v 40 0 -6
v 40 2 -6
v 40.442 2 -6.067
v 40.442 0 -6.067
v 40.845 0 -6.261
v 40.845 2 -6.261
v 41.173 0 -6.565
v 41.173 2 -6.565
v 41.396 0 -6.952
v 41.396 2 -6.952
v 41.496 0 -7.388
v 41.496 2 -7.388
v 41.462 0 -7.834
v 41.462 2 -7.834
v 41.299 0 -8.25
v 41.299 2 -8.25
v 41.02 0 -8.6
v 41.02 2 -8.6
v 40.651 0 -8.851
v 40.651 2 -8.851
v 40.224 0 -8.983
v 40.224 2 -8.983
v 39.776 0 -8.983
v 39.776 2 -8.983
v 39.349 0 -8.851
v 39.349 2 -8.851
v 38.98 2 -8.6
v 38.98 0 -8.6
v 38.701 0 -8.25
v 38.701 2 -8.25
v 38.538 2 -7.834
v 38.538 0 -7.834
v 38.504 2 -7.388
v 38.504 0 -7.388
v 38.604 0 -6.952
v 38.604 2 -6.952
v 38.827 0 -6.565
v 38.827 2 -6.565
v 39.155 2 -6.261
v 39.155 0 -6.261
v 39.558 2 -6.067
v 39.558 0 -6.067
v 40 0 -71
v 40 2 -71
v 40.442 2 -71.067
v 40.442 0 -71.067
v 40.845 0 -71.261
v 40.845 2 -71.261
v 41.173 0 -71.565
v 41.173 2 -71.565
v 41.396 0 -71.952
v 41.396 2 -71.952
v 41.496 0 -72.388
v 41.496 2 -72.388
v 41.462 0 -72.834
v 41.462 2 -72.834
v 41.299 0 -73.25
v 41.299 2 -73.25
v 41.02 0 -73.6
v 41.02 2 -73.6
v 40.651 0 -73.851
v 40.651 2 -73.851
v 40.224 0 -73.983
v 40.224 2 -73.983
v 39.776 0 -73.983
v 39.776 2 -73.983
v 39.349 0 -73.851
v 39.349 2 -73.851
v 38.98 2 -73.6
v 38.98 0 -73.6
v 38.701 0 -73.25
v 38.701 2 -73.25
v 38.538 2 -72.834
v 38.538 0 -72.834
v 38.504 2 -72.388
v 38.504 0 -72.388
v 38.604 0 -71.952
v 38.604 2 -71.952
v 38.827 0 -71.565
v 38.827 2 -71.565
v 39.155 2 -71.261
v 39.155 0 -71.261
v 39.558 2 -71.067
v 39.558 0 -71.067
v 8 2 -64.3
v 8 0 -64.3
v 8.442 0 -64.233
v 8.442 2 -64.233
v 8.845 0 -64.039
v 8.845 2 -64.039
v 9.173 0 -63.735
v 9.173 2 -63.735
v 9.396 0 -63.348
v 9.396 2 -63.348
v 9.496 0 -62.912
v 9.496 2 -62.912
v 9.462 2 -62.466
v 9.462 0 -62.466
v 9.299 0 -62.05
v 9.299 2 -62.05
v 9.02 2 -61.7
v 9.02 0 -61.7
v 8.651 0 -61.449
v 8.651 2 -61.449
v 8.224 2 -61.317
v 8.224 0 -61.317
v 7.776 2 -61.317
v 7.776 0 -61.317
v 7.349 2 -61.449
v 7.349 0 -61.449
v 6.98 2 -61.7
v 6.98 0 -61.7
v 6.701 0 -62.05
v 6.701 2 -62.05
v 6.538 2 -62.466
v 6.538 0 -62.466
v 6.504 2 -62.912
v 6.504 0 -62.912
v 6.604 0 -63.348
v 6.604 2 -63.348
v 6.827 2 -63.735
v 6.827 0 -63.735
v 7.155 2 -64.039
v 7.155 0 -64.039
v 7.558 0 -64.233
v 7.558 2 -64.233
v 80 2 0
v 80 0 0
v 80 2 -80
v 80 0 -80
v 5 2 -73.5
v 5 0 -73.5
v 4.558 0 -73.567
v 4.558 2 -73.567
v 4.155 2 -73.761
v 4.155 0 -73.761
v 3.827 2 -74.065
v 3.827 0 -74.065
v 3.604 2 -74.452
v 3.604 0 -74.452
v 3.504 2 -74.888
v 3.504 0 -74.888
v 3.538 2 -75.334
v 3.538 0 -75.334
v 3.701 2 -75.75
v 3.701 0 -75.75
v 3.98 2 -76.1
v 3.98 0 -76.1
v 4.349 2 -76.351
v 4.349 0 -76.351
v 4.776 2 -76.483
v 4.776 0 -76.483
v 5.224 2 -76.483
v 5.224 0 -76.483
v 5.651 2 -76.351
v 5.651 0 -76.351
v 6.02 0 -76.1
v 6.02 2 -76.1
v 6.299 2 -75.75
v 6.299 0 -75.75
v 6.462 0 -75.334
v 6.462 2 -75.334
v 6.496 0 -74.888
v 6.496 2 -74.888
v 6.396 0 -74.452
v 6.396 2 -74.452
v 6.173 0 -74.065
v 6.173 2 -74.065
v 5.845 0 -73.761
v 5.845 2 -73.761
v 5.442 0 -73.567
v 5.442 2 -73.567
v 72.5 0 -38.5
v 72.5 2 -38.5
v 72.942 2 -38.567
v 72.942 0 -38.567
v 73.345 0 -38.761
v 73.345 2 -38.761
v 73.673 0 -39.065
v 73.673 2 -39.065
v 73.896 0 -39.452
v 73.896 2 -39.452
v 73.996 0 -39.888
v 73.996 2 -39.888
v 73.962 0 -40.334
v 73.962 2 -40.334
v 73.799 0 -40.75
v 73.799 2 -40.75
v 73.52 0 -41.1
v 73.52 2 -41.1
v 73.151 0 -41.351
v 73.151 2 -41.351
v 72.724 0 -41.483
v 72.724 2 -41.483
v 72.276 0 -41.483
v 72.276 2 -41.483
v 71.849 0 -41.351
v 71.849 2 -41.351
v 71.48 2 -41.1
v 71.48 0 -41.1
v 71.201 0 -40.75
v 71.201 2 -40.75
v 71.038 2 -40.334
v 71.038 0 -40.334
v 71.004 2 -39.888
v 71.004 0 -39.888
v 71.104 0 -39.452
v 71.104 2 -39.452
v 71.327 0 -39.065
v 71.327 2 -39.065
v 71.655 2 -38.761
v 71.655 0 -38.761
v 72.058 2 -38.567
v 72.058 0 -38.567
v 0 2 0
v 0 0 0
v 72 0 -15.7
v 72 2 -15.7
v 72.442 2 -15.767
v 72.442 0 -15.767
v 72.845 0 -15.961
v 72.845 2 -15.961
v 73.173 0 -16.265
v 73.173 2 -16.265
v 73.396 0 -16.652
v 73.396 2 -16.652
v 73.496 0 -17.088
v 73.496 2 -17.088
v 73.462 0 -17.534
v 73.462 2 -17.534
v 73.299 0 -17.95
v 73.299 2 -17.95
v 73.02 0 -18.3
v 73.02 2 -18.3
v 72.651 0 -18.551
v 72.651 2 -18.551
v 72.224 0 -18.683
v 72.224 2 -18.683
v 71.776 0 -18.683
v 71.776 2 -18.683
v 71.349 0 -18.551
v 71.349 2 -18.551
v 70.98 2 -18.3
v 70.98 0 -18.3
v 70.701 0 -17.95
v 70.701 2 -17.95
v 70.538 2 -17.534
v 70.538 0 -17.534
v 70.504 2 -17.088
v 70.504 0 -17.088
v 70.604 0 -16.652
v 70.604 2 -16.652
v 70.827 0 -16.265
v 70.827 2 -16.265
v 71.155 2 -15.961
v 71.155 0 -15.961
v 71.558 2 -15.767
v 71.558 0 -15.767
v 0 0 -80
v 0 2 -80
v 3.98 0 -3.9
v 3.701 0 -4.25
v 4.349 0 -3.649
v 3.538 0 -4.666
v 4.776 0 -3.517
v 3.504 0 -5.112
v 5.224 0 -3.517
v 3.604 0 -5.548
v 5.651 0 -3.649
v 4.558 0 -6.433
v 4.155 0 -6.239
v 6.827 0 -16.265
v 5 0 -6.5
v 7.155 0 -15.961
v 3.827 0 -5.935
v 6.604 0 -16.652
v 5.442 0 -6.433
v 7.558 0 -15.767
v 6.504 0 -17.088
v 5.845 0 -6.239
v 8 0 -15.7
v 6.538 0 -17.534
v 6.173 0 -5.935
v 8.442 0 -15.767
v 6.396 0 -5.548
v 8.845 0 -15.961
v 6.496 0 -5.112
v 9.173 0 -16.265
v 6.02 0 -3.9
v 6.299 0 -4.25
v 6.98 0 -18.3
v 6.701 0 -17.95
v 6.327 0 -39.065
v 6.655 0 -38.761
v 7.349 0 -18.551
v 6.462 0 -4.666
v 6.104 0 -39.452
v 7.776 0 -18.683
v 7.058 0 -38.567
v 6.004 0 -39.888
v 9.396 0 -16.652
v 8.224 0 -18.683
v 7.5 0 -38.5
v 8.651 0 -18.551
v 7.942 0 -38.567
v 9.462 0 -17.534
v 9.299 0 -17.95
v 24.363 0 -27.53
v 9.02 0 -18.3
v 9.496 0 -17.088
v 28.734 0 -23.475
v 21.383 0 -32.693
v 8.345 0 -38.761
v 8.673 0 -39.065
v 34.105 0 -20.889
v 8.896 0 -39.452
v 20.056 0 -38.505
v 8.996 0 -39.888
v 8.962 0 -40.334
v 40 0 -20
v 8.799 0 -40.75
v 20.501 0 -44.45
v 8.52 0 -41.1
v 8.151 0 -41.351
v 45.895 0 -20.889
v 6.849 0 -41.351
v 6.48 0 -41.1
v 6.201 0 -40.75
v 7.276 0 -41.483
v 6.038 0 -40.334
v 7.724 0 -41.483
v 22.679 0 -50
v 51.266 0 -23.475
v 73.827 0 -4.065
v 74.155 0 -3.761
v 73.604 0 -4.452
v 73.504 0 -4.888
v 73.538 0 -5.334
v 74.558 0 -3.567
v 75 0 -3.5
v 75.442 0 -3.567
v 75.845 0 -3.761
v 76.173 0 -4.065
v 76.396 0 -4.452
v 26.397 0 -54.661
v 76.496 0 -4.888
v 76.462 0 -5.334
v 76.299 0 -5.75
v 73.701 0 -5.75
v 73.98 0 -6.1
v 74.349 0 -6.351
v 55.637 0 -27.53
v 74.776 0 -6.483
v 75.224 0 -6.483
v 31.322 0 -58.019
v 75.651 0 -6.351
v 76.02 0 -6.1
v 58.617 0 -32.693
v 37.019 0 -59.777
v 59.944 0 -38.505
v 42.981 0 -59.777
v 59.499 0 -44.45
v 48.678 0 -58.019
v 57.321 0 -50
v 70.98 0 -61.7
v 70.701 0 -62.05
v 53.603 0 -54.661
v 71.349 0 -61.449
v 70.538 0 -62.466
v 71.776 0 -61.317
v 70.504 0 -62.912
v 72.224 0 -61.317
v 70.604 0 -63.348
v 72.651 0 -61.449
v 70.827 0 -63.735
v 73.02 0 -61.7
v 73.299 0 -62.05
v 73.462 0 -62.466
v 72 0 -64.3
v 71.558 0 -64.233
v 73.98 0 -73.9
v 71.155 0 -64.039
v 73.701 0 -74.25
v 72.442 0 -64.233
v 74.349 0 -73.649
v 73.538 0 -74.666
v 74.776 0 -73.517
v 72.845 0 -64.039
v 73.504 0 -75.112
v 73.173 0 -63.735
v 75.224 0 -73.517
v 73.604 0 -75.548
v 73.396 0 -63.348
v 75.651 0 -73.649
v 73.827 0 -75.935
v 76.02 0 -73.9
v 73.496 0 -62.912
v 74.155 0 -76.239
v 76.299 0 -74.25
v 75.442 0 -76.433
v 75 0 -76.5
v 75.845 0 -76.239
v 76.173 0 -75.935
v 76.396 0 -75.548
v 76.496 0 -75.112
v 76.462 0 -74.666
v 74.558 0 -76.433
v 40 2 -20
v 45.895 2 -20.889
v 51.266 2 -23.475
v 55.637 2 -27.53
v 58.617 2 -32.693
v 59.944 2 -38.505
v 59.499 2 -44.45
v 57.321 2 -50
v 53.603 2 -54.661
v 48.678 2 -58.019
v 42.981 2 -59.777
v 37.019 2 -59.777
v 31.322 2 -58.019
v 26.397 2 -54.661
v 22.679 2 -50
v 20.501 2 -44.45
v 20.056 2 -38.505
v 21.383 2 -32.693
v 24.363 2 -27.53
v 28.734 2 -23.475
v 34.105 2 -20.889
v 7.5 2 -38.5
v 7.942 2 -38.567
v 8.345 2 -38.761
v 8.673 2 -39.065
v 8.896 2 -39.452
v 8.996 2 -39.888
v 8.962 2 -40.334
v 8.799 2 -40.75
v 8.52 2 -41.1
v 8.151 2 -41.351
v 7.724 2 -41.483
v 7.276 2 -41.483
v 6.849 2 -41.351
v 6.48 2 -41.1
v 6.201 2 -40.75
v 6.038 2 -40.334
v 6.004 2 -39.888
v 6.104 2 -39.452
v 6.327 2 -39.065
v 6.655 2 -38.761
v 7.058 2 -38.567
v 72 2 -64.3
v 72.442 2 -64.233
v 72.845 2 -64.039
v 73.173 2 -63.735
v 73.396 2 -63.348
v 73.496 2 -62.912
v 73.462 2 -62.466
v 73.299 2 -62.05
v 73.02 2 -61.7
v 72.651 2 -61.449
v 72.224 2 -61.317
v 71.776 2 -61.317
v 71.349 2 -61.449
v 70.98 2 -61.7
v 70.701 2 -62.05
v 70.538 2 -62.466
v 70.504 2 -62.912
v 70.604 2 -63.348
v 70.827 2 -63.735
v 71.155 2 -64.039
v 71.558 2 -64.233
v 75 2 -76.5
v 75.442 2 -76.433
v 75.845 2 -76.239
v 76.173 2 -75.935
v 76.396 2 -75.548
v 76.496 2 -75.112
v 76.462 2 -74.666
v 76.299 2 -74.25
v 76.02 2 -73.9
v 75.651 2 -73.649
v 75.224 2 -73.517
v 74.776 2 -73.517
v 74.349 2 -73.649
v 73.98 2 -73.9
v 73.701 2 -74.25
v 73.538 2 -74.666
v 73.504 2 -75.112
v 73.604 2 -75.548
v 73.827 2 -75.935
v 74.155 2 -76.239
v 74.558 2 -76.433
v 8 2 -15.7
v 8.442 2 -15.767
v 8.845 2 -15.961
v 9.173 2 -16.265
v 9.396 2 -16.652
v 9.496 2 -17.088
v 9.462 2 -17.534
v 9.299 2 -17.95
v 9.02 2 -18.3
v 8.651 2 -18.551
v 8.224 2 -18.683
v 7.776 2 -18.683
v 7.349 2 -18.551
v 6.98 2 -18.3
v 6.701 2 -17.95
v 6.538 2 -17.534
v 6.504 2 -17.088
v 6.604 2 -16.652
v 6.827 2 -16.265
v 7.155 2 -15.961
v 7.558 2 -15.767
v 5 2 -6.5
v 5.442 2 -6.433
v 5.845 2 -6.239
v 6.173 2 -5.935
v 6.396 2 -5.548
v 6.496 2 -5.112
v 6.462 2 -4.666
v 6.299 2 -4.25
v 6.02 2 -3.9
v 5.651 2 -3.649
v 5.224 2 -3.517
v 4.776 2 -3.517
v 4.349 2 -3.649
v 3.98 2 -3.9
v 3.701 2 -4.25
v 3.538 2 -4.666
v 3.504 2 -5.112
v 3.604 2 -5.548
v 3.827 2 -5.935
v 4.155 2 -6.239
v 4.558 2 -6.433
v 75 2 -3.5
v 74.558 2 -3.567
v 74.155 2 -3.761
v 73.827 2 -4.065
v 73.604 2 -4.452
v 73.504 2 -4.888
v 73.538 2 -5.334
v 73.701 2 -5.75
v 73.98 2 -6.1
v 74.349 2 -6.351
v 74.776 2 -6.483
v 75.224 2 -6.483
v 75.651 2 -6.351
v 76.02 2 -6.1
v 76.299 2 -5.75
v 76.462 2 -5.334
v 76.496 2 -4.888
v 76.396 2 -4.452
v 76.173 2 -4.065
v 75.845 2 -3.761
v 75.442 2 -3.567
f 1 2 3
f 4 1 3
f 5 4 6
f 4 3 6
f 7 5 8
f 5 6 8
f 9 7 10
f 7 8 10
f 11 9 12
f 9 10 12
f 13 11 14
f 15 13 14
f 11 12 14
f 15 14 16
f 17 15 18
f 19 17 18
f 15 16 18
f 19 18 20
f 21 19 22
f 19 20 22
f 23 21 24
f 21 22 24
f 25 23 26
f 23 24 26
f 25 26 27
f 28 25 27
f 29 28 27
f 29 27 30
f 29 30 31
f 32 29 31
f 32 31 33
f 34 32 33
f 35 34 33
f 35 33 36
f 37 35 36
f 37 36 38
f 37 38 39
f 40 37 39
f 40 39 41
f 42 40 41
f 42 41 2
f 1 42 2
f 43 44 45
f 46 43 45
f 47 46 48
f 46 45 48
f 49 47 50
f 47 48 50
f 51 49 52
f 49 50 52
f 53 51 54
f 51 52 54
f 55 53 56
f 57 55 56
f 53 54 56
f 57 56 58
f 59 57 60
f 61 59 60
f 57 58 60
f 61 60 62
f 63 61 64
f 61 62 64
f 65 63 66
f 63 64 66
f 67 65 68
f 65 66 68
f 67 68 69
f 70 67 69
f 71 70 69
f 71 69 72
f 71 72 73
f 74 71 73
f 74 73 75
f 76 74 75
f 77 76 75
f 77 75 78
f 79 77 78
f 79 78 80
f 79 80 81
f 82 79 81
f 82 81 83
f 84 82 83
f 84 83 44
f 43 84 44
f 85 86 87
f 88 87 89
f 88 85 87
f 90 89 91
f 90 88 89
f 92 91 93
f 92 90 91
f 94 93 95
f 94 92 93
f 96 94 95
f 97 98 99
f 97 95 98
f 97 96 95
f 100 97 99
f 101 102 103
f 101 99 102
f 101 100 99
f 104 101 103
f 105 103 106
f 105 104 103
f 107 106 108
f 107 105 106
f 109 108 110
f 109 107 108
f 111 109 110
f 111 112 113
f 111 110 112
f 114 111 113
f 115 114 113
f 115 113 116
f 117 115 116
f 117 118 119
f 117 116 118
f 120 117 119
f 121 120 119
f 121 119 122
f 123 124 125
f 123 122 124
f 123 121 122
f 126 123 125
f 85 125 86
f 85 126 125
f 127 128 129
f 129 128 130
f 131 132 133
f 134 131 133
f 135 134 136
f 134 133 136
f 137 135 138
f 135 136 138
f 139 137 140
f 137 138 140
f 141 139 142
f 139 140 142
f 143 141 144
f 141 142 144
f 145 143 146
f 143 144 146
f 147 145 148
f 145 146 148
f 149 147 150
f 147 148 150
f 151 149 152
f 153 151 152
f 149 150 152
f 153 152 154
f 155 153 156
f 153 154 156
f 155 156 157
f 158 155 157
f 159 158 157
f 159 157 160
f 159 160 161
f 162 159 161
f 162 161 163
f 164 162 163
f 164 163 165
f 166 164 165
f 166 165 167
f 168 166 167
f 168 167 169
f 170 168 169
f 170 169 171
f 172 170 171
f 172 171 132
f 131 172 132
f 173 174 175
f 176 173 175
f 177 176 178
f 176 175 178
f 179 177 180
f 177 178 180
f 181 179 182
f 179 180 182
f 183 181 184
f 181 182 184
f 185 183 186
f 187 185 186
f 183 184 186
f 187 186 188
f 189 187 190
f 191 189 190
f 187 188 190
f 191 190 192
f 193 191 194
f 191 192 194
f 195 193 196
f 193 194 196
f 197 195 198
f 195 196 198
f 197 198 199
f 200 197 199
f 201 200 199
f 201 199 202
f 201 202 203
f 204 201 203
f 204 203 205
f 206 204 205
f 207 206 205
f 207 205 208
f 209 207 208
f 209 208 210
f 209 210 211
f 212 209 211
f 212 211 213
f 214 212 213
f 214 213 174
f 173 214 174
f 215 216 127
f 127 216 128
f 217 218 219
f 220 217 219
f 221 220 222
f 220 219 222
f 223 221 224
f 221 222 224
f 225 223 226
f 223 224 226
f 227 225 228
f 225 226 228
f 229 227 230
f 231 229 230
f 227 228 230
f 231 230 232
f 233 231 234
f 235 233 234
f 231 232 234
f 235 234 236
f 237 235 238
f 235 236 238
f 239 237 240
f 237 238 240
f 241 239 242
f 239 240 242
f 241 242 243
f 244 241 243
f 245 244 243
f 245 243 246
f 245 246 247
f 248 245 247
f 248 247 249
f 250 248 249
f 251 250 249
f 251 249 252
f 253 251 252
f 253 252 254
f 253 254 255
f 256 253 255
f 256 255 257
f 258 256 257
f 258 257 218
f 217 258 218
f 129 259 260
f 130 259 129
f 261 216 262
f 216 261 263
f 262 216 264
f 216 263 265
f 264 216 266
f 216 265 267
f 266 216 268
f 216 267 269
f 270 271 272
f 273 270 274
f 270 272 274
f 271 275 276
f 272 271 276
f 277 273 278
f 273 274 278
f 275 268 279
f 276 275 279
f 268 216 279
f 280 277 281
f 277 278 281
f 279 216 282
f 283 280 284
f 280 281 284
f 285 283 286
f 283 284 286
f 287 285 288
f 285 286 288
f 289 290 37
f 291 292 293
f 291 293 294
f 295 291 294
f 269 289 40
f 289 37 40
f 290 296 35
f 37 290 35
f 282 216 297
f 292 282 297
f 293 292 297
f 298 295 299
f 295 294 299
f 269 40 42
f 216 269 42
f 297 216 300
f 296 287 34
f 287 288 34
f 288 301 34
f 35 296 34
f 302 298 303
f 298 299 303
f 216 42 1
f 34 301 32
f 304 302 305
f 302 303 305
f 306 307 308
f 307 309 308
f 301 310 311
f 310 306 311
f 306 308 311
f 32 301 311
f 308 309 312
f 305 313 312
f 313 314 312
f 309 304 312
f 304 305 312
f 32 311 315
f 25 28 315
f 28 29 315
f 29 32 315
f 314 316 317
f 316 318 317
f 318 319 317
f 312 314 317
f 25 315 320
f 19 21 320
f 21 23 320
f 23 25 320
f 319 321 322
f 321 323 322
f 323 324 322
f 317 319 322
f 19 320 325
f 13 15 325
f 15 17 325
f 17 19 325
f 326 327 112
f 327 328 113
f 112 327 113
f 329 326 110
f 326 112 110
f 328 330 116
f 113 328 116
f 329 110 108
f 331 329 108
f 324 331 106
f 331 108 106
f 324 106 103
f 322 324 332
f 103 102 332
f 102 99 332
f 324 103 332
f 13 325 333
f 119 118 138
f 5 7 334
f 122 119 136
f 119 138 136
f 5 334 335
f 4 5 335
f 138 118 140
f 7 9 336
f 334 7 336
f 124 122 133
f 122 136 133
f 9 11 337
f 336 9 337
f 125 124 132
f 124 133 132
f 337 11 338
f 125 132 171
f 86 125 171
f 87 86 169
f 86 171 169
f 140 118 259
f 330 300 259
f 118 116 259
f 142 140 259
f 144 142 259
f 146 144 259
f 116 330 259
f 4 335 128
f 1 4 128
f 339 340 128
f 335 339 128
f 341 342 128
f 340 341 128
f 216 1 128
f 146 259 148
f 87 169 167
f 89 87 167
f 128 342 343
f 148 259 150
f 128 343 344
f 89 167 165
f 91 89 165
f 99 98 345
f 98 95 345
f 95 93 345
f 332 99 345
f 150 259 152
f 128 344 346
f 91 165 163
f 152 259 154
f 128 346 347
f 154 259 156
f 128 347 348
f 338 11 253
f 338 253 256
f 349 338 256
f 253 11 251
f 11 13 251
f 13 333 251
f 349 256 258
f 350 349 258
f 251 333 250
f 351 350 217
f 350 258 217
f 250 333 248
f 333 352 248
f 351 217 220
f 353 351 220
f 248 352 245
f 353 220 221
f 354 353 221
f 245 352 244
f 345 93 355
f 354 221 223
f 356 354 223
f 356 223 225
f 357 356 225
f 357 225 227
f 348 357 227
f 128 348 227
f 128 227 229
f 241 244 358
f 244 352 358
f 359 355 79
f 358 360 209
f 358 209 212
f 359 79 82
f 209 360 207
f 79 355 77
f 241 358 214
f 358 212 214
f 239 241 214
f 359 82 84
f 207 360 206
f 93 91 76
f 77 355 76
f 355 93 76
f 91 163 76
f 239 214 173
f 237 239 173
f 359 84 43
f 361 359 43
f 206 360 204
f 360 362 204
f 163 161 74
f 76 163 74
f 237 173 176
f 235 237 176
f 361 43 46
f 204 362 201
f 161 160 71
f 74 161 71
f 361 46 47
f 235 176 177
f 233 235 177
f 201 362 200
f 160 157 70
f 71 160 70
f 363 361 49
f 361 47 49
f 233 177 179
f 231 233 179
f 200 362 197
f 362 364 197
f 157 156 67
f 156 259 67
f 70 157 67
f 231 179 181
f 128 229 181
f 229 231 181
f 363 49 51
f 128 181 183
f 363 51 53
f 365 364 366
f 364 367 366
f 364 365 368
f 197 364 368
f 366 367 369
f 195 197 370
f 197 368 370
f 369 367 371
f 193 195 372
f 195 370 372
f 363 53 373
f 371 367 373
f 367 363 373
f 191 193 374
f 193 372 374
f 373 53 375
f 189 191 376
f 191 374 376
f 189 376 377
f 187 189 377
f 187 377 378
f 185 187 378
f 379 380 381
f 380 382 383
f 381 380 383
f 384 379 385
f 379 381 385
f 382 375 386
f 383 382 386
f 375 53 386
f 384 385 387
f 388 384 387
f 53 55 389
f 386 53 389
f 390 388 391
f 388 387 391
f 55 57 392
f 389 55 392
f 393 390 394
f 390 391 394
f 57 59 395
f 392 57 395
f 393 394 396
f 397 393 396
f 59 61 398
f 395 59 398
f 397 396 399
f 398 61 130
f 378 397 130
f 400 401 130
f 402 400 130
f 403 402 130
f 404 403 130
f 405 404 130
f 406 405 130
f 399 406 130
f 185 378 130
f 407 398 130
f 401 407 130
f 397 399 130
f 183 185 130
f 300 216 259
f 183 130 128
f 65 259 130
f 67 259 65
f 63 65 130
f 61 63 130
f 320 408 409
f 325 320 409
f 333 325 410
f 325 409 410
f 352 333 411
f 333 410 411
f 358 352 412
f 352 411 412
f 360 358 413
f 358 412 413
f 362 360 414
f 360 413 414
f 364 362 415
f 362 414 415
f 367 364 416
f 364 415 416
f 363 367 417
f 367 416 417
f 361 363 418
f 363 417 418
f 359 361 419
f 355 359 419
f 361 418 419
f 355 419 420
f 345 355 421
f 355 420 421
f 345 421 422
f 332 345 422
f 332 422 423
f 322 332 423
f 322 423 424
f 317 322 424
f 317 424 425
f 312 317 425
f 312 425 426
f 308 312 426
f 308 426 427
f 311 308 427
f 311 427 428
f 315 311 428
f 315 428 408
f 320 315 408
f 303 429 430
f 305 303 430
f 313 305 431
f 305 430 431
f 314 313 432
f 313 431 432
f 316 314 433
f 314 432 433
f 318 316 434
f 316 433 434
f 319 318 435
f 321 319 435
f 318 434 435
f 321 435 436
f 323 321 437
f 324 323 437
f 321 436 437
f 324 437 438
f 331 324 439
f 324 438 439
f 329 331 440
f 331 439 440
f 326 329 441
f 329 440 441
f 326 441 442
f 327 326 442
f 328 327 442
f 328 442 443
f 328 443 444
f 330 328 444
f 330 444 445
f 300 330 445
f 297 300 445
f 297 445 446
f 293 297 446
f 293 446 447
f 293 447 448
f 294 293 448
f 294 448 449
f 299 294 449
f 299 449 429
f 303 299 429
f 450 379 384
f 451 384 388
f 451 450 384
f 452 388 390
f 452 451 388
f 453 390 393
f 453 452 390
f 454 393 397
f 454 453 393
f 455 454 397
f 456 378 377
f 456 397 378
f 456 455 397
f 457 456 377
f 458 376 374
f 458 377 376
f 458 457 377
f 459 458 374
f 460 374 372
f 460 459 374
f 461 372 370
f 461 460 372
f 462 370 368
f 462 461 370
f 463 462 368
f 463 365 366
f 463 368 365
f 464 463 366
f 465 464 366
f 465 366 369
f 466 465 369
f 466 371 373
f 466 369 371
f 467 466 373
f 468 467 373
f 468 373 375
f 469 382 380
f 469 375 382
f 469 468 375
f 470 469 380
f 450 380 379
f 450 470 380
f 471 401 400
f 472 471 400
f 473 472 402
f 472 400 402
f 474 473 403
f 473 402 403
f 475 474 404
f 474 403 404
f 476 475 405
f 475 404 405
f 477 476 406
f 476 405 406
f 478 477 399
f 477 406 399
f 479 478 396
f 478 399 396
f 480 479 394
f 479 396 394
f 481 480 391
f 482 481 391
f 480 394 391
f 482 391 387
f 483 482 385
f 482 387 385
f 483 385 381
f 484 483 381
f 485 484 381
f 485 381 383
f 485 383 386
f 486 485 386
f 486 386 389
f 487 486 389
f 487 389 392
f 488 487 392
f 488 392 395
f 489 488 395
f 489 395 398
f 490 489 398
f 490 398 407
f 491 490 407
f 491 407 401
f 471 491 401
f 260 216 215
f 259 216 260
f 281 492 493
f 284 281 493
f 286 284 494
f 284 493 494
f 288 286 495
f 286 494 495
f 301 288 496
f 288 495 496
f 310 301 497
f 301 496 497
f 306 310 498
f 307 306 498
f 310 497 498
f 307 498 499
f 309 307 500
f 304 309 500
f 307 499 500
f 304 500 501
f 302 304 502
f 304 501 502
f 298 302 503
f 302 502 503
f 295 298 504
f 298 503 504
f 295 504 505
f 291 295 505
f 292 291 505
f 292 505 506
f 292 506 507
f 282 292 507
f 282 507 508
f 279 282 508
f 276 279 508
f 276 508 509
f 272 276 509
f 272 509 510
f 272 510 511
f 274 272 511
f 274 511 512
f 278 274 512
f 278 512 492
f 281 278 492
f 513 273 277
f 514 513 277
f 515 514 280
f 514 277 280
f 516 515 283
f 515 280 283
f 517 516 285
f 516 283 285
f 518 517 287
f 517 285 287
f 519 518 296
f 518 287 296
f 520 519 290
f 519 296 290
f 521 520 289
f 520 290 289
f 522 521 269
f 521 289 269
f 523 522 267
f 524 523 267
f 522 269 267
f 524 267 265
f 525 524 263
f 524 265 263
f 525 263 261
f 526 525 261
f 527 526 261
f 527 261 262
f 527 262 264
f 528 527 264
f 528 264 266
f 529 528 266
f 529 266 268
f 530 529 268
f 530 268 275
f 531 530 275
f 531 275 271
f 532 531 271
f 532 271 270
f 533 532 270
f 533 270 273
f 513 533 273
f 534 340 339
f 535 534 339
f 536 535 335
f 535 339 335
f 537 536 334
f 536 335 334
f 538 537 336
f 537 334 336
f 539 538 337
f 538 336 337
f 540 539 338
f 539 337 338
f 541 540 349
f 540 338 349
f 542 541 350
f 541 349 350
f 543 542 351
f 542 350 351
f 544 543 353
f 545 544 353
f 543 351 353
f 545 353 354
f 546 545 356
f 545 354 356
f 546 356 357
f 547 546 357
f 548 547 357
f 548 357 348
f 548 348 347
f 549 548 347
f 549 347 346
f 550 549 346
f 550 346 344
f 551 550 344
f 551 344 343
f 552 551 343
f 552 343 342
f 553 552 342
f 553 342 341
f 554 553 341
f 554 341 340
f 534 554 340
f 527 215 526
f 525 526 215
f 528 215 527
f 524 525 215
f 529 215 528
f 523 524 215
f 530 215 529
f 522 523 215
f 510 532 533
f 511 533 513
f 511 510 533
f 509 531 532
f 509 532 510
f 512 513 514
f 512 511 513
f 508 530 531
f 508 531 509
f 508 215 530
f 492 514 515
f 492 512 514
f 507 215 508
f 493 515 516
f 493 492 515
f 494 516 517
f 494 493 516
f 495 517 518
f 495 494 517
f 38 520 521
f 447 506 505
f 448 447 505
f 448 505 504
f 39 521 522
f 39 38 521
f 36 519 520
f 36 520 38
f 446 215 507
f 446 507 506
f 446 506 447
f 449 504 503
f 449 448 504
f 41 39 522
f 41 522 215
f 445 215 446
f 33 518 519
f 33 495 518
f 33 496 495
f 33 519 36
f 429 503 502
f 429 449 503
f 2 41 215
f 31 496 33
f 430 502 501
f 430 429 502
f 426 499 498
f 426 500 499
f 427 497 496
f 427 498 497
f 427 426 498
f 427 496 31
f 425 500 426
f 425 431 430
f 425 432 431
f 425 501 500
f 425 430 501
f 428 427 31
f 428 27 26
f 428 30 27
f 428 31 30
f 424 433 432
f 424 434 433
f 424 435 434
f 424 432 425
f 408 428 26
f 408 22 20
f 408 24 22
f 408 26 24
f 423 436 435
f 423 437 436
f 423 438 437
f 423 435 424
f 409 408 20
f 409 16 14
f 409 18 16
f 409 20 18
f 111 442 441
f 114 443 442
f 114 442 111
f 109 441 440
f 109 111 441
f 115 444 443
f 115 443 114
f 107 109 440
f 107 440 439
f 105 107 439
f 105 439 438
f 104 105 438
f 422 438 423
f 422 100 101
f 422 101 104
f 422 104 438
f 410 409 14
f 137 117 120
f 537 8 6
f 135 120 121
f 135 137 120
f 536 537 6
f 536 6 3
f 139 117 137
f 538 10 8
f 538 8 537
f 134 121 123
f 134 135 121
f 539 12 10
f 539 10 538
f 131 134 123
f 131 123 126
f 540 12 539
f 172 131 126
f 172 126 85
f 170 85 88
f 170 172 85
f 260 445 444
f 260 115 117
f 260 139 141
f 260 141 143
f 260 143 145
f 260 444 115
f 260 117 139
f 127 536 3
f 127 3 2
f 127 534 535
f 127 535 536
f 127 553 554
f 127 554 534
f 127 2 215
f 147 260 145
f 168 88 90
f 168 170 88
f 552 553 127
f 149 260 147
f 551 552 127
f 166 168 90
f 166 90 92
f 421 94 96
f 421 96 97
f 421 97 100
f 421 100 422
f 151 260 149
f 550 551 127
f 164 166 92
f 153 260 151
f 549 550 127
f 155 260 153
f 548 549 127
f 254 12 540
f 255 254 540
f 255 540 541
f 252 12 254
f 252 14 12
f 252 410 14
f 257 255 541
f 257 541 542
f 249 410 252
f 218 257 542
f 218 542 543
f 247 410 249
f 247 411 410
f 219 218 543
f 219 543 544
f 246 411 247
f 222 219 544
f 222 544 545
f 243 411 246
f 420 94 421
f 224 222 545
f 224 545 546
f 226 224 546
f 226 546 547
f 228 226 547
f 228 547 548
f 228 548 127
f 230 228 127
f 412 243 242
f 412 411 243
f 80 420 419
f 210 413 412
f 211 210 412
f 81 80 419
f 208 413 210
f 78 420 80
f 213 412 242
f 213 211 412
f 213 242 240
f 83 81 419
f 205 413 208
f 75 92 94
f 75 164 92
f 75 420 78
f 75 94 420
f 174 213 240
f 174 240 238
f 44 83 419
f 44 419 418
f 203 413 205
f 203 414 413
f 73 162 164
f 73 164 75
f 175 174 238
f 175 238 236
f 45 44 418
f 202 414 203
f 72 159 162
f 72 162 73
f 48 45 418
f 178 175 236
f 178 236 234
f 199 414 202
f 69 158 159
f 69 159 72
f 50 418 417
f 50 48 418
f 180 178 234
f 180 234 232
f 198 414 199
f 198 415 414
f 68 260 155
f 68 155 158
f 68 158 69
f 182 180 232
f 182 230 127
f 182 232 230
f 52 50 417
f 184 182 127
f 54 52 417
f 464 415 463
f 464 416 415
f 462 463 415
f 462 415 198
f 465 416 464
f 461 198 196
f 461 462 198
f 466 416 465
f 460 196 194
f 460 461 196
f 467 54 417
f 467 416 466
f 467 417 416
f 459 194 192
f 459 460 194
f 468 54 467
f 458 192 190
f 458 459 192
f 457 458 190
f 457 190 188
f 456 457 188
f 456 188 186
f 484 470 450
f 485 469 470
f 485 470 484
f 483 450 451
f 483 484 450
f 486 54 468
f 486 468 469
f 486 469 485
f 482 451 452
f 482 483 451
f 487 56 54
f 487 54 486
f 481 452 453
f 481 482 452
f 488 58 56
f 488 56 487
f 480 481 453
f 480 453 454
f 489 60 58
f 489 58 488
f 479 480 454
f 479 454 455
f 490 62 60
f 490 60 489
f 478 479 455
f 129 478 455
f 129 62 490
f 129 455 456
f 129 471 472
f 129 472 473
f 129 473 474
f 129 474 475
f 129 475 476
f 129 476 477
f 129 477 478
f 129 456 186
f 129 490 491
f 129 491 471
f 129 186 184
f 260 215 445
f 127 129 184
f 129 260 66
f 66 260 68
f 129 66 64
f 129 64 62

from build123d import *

# Parameters (mm, degrees)
SKETCH1_W           = 80
SKETCH1_H           = 80
BOSS_EXTRUDE1_DEPTH = 2
SKETCH4_R           = 1.5
CUT_EXTRUDE3_DEPTH  = 114.154761279
SKETCH6_R           = 1.5
CUT_EXTRUDE4_DEPTH  = 114.154761279
SKETCH8_R           = 20
SKETCH8_R_2         = 1.5
CUT_EXTRUDE6_DEPTH  = 114.154761279


with BuildPart() as part:
    # Sketch1 → Boss-Extrude1 (new body)
    with BuildSketch(Plane(origin=(0, 0, 0), x_dir=(1, 0, 0), z_dir=(0, 1, 0))):
        with Locations((40, 40)):
            Rectangle(SKETCH1_W, SKETCH1_H)
    extrude(amount=BOSS_EXTRUDE1_DEPTH)

    # Sketch4 → Cut-Extrude3 (cut, through all)
    with BuildSketch(Plane.XZ):
        with Locations(Location((5, -5, 0), (0, 0, 270))):
            Circle(SKETCH4_R)
        with Locations(Location((75, -5, 0), (0, 0, 90))):
            Circle(SKETCH4_R)
        with Locations(Location((75, -75, 0), (0, 0, 270))):
            Circle(SKETCH4_R)
        with Locations(Location((5, -75, 0), (0, 0, 90))):
            Circle(SKETCH4_R)
    extrude(amount=-CUT_EXTRUDE3_DEPTH, mode=Mode.SUBTRACT)

    # Sketch6 → Cut-Extrude4 (cut, through all)
    with BuildSketch(Plane(origin=(0, 2, 0), x_dir=(1, 0, 0), z_dir=(0, 1, 0))):
        with Locations(Location((8, 17.2, 0), (0, 0, 270))):
            Circle(SKETCH6_R)
        with Locations(Location((72, 17.2, 0), (0, 0, 270))):
            Circle(SKETCH6_R)
    cut_extrude4 = extrude(amount=-CUT_EXTRUDE4_DEPTH, mode=Mode.SUBTRACT)

    # Mirror1: Cut-Extrude4 across plane
    add(cut_extrude4.mirror(Plane.XY.offset(-40)), mode=Mode.SUBTRACT)

    # Sketch8 → Cut-Extrude6 (cut, through all)
    with BuildSketch(Plane(origin=(0, 2, 0), x_dir=(1, 0, 0), z_dir=(0, 1, 0))):
        with Locations(Location((40, 40, 0), (0, 0, 270))):
            Circle(SKETCH8_R)
        with Locations(Location((40, 72.5, 0), (0, 0, 270))):
            Circle(SKETCH8_R_2)
        with Locations(Location((72.5, 40, 0), (0, 0, 270))):
            Circle(SKETCH8_R_2)
        with Locations(Location((40, 7.5, 0), (0, 0, 270))):
            Circle(SKETCH8_R_2)
        with Locations(Location((7.5, 40, 0), (0, 0, 270))):
            Circle(SKETCH8_R_2)
    extrude(amount=-CUT_EXTRUDE6_DEPTH, mode=Mode.SUBTRACT)


solid = part.part
